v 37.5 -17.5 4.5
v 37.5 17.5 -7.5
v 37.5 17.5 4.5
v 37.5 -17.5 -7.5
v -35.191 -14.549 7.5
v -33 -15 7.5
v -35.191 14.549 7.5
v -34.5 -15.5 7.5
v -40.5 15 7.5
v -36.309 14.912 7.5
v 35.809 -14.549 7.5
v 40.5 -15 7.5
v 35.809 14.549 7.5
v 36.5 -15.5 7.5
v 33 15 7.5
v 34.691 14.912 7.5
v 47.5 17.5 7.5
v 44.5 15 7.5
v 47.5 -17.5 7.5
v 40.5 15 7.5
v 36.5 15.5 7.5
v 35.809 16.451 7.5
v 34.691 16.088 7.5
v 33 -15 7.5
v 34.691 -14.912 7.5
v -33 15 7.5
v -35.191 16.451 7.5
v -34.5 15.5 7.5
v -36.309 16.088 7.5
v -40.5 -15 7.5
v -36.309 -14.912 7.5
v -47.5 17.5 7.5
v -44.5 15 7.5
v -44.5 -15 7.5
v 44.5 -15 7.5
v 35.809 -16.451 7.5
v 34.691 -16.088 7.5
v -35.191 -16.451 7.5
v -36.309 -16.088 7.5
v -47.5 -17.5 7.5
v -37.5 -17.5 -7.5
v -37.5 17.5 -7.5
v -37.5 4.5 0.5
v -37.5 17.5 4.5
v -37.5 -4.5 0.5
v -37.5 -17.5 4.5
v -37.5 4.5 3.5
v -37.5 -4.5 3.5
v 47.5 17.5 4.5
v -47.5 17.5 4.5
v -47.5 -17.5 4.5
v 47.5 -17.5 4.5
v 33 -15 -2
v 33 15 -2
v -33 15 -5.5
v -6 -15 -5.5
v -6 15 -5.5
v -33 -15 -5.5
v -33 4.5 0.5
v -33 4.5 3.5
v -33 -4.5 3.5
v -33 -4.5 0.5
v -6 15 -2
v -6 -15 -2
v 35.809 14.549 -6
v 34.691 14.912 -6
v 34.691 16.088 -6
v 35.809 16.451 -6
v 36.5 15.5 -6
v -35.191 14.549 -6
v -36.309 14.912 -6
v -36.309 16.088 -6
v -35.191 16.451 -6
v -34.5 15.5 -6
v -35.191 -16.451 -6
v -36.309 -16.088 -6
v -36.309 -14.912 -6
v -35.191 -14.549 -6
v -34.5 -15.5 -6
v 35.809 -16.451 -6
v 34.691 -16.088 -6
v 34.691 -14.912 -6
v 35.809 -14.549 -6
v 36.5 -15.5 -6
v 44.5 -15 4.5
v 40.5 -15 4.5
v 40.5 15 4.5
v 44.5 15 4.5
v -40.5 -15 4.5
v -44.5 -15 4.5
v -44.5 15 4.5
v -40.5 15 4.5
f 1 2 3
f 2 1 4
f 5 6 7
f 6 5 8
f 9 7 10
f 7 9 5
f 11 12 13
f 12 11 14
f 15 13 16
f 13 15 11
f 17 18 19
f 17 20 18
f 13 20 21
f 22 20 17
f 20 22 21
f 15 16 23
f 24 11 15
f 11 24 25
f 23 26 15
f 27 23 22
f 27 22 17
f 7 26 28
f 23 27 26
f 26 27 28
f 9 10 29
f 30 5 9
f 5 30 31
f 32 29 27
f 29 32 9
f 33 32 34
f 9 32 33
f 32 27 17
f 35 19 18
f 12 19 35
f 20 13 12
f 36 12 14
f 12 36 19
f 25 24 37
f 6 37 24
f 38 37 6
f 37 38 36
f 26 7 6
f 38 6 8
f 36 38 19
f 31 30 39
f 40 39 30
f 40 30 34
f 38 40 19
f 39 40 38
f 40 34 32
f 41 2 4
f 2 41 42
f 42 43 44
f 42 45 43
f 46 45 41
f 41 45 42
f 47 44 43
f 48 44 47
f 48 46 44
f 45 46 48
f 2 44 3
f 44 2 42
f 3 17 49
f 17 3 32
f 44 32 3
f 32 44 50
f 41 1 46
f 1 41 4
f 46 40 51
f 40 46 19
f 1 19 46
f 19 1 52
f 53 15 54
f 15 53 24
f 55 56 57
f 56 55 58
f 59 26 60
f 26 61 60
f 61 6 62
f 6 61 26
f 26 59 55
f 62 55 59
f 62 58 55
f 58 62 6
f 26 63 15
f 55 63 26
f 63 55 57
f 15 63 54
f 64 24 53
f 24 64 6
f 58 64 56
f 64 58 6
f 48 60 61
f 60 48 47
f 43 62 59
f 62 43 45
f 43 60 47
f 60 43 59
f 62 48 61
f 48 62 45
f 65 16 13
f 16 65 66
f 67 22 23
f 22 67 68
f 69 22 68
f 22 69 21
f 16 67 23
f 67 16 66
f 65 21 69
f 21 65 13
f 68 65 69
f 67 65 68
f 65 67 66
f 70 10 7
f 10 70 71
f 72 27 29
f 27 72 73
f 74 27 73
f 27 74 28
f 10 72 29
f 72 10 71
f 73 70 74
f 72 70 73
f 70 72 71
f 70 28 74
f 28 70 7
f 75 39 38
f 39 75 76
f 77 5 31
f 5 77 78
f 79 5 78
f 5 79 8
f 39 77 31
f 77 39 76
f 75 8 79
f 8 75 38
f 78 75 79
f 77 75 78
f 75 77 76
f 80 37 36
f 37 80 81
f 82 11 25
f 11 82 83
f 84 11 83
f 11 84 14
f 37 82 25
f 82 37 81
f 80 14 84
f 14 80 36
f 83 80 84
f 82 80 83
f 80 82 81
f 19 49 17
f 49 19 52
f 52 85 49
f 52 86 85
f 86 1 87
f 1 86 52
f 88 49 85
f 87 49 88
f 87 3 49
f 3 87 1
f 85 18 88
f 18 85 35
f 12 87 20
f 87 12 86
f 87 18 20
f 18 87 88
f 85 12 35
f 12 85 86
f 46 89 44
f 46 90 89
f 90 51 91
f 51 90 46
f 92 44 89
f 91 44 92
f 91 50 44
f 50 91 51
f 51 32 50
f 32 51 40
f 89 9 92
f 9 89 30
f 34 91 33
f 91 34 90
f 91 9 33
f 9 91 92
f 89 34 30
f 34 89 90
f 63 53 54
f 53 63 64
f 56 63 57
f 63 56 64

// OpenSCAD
//device dimensions
//63.64 * 28.0 * 9mm
//without USB port or pins
//battery 26x20x4
//display 23 x 13
//total thickness needed = 18mm
//
//bottom half is a open box with wings for attaching to a strap


//TODO. need a hole for the USB port
overallX = 75;
overallY = 35;
tophalfZ = 15;
hole_r = 1;
hole_offset = 2;

difference() {
cube([overallX,overallY,tophalfZ],center=true);
translate([0,0,2])
    cube([66,30,15],center=true);//hole for device & batt
translate([-overallX/2,0,2])
    cube([10,9,3],center=true);//hole for USB
translate([overallX/2-hole_offset,overallY/2-hole_offset,-6])
    cylinder(20,hole_r,hole_r);
translate([-overallX/2+hole_offset,overallY/2-hole_offset,-6])
    cylinder(20,hole_r,hole_r);
translate([-overallX/2+hole_offset,-overallY/2+hole_offset,-6])
    cylinder(20,hole_r,hole_r);
translate([overallX/2-hole_offset,-overallY/2+hole_offset,-6])
    cylinder(20,hole_r,hole_r);
}
//make a hole for the battery or more accuratly, fill it.
translate([14,0,-4])
    cube([66-26,30,4],center=true);
//right strap connector
difference() {
translate([(75+10)/2,0,6])
    cube([10,35,3],center=true);
translate([(75+10)/2,0,10/2])
    cube([4,30,7],center=true);
}
//left strap connector
difference() {
translate([-(75+10)/2,0,6])
    cube([10,35,3],center=true);
translate([-(75+10)/2,0,10/2])
    cube([4,30,7],center=true);
}
